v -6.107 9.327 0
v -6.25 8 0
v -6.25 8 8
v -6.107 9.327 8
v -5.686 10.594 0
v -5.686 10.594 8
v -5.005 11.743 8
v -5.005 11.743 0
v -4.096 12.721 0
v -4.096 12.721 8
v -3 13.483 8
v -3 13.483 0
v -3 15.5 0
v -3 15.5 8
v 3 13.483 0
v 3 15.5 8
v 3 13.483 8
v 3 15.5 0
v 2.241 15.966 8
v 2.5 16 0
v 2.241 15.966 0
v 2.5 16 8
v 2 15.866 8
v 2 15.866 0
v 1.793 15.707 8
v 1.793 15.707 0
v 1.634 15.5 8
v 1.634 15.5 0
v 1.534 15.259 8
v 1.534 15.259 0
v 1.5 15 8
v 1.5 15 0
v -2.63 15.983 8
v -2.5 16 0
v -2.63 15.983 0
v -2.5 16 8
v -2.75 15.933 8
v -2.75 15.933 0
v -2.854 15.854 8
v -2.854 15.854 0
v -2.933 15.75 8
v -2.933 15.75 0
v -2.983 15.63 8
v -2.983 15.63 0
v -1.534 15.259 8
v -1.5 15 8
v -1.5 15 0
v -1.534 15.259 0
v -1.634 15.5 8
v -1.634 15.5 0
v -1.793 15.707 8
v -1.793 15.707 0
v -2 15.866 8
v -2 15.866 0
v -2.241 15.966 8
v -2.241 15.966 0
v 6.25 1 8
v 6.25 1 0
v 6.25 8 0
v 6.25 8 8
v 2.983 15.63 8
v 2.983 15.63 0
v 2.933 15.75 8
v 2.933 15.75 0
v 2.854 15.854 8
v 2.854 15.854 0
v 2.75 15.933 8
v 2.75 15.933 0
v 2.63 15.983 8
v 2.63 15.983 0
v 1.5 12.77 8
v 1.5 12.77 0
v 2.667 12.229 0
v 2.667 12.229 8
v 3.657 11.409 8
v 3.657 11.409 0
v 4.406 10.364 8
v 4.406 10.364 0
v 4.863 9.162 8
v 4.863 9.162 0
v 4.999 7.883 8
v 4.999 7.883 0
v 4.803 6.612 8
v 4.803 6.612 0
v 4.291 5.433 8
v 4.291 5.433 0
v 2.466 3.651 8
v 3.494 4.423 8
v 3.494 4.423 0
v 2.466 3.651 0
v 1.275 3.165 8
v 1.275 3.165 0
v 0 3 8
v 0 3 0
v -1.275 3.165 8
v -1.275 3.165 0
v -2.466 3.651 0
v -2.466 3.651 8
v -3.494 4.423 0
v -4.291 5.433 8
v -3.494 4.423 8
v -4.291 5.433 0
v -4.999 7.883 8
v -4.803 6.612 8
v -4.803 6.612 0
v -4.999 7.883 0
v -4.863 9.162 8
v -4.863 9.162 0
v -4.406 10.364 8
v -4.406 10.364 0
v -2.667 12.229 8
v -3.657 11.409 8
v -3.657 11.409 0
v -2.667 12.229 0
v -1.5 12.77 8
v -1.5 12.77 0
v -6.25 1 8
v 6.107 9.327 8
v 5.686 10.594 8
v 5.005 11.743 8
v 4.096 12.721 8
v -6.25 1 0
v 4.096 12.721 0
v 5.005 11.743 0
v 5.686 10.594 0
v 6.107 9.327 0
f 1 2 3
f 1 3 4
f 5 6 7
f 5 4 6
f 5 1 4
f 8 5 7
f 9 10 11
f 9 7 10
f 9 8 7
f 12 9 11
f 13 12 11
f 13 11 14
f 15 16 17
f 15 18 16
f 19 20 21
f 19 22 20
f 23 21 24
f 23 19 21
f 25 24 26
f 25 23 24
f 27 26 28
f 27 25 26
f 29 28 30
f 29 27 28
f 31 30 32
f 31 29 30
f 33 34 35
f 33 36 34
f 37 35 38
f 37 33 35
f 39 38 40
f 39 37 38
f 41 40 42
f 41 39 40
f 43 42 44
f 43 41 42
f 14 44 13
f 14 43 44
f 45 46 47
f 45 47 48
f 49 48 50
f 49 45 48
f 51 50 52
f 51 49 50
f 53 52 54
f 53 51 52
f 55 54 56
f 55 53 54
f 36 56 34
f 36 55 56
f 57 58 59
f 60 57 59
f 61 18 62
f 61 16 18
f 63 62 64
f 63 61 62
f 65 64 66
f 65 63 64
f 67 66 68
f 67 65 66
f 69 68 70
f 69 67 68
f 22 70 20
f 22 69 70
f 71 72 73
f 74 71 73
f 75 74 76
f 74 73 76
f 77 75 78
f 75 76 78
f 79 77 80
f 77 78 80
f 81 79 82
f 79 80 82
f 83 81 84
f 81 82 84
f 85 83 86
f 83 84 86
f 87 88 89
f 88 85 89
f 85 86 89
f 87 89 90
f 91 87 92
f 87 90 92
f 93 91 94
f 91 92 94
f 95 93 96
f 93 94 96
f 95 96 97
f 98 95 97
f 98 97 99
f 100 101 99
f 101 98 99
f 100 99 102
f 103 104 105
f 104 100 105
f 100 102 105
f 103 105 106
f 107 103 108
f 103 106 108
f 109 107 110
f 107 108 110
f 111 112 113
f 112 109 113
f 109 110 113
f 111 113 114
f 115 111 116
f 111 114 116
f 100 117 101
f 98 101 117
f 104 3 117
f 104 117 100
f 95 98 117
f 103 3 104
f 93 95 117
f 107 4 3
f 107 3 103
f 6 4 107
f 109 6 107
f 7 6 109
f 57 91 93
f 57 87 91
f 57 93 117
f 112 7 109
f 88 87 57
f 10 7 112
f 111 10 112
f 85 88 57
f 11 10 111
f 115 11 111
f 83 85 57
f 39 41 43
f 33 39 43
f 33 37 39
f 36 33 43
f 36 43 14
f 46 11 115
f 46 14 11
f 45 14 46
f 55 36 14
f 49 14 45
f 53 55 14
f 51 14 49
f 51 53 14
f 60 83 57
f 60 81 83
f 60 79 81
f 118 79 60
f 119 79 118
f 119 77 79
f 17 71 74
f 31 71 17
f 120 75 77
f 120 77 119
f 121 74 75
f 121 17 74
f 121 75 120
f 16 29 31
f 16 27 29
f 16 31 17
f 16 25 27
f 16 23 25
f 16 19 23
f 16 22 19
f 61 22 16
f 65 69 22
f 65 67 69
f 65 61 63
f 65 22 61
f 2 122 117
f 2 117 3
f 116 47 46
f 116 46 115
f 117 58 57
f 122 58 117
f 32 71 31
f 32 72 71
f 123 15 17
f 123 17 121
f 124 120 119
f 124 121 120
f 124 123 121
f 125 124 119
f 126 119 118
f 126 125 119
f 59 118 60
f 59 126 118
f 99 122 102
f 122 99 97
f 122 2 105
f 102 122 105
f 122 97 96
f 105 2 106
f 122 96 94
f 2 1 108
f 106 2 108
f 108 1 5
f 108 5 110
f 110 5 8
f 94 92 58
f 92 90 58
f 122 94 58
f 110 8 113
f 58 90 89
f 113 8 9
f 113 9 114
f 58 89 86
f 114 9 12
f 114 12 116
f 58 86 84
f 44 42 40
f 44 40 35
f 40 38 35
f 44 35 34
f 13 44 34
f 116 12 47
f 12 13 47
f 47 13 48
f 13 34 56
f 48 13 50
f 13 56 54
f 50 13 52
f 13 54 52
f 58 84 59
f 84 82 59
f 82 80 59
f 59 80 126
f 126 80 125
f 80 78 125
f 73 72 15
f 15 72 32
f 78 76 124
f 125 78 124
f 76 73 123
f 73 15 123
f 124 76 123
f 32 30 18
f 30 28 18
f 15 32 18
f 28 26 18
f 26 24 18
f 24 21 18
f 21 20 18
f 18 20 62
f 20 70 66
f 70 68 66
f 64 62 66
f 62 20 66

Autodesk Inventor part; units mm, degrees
ref_plane "YZ Plane" through (0, 0, 0) normal (1, 0, 0) x (0, 1, 0)
ref_plane "XZ Plane" through (0, 0, 0) normal (0, 1, 0) x (-1, 0, 0)
ref_plane "XY Plane" through (0, 0, 0) normal (0, 0, 1) x (1, 0, 0)
sketch "Sketch3" plane through (0, 0, 0) normal (0, 0, 1) x (1, 0, 0)
  line L0 (-6.25, 1) -> (-6.25, 8)
  line L1 (6.25, 1) -> (6.25, 8)
  arc A0 (-1.5, 12.7697) -> (1.5, 12.7697) centre (0, 8) ccw
  line L2 (-3, 13.4829) -> (-3, 16)
  line L3 (-3, 16) -> (-1.5, 16)
  line L4 (1.5, 16) -> (3, 16)
  line L5 (3, 16) -> (3, 13.4829)
  arc A1 (-3, 13.4829) -> (-6.25, 8) centre (0, 8) ccw
  arc A2 (6.25, 8) -> (3, 13.4829) centre (0, 8) ccw
  line L6 (6.25, 1) -> (-6.25, 1)
  line L7 (-1.5, 16) -> (-1.5, 12.7697)
  line L8 (1.5, 12.7697) -> (1.5, 16)
  point P0 (0, 0)
  dimension "d10" = 10
  dimension "d12" = 8
  dimension "d13" = 1.5
  dimension "d21" = 1.25
  dimension "d22" = 1.25
  dimension "d24" = 7
  dimension "d25" = 8
  dimension "d26" = 3
extrude "Extrusion1" add sketch "Sketch3" along normal blind 8
fillet "Fillet1" radius 1 2 edges at (-1.5, 16, 4) (1.5, 16, 4)
fillet "Fillet2" radius 0.5 2 edges at (3, 16, 4) (-3, 16, 4)
properties part number "WireClip10"
